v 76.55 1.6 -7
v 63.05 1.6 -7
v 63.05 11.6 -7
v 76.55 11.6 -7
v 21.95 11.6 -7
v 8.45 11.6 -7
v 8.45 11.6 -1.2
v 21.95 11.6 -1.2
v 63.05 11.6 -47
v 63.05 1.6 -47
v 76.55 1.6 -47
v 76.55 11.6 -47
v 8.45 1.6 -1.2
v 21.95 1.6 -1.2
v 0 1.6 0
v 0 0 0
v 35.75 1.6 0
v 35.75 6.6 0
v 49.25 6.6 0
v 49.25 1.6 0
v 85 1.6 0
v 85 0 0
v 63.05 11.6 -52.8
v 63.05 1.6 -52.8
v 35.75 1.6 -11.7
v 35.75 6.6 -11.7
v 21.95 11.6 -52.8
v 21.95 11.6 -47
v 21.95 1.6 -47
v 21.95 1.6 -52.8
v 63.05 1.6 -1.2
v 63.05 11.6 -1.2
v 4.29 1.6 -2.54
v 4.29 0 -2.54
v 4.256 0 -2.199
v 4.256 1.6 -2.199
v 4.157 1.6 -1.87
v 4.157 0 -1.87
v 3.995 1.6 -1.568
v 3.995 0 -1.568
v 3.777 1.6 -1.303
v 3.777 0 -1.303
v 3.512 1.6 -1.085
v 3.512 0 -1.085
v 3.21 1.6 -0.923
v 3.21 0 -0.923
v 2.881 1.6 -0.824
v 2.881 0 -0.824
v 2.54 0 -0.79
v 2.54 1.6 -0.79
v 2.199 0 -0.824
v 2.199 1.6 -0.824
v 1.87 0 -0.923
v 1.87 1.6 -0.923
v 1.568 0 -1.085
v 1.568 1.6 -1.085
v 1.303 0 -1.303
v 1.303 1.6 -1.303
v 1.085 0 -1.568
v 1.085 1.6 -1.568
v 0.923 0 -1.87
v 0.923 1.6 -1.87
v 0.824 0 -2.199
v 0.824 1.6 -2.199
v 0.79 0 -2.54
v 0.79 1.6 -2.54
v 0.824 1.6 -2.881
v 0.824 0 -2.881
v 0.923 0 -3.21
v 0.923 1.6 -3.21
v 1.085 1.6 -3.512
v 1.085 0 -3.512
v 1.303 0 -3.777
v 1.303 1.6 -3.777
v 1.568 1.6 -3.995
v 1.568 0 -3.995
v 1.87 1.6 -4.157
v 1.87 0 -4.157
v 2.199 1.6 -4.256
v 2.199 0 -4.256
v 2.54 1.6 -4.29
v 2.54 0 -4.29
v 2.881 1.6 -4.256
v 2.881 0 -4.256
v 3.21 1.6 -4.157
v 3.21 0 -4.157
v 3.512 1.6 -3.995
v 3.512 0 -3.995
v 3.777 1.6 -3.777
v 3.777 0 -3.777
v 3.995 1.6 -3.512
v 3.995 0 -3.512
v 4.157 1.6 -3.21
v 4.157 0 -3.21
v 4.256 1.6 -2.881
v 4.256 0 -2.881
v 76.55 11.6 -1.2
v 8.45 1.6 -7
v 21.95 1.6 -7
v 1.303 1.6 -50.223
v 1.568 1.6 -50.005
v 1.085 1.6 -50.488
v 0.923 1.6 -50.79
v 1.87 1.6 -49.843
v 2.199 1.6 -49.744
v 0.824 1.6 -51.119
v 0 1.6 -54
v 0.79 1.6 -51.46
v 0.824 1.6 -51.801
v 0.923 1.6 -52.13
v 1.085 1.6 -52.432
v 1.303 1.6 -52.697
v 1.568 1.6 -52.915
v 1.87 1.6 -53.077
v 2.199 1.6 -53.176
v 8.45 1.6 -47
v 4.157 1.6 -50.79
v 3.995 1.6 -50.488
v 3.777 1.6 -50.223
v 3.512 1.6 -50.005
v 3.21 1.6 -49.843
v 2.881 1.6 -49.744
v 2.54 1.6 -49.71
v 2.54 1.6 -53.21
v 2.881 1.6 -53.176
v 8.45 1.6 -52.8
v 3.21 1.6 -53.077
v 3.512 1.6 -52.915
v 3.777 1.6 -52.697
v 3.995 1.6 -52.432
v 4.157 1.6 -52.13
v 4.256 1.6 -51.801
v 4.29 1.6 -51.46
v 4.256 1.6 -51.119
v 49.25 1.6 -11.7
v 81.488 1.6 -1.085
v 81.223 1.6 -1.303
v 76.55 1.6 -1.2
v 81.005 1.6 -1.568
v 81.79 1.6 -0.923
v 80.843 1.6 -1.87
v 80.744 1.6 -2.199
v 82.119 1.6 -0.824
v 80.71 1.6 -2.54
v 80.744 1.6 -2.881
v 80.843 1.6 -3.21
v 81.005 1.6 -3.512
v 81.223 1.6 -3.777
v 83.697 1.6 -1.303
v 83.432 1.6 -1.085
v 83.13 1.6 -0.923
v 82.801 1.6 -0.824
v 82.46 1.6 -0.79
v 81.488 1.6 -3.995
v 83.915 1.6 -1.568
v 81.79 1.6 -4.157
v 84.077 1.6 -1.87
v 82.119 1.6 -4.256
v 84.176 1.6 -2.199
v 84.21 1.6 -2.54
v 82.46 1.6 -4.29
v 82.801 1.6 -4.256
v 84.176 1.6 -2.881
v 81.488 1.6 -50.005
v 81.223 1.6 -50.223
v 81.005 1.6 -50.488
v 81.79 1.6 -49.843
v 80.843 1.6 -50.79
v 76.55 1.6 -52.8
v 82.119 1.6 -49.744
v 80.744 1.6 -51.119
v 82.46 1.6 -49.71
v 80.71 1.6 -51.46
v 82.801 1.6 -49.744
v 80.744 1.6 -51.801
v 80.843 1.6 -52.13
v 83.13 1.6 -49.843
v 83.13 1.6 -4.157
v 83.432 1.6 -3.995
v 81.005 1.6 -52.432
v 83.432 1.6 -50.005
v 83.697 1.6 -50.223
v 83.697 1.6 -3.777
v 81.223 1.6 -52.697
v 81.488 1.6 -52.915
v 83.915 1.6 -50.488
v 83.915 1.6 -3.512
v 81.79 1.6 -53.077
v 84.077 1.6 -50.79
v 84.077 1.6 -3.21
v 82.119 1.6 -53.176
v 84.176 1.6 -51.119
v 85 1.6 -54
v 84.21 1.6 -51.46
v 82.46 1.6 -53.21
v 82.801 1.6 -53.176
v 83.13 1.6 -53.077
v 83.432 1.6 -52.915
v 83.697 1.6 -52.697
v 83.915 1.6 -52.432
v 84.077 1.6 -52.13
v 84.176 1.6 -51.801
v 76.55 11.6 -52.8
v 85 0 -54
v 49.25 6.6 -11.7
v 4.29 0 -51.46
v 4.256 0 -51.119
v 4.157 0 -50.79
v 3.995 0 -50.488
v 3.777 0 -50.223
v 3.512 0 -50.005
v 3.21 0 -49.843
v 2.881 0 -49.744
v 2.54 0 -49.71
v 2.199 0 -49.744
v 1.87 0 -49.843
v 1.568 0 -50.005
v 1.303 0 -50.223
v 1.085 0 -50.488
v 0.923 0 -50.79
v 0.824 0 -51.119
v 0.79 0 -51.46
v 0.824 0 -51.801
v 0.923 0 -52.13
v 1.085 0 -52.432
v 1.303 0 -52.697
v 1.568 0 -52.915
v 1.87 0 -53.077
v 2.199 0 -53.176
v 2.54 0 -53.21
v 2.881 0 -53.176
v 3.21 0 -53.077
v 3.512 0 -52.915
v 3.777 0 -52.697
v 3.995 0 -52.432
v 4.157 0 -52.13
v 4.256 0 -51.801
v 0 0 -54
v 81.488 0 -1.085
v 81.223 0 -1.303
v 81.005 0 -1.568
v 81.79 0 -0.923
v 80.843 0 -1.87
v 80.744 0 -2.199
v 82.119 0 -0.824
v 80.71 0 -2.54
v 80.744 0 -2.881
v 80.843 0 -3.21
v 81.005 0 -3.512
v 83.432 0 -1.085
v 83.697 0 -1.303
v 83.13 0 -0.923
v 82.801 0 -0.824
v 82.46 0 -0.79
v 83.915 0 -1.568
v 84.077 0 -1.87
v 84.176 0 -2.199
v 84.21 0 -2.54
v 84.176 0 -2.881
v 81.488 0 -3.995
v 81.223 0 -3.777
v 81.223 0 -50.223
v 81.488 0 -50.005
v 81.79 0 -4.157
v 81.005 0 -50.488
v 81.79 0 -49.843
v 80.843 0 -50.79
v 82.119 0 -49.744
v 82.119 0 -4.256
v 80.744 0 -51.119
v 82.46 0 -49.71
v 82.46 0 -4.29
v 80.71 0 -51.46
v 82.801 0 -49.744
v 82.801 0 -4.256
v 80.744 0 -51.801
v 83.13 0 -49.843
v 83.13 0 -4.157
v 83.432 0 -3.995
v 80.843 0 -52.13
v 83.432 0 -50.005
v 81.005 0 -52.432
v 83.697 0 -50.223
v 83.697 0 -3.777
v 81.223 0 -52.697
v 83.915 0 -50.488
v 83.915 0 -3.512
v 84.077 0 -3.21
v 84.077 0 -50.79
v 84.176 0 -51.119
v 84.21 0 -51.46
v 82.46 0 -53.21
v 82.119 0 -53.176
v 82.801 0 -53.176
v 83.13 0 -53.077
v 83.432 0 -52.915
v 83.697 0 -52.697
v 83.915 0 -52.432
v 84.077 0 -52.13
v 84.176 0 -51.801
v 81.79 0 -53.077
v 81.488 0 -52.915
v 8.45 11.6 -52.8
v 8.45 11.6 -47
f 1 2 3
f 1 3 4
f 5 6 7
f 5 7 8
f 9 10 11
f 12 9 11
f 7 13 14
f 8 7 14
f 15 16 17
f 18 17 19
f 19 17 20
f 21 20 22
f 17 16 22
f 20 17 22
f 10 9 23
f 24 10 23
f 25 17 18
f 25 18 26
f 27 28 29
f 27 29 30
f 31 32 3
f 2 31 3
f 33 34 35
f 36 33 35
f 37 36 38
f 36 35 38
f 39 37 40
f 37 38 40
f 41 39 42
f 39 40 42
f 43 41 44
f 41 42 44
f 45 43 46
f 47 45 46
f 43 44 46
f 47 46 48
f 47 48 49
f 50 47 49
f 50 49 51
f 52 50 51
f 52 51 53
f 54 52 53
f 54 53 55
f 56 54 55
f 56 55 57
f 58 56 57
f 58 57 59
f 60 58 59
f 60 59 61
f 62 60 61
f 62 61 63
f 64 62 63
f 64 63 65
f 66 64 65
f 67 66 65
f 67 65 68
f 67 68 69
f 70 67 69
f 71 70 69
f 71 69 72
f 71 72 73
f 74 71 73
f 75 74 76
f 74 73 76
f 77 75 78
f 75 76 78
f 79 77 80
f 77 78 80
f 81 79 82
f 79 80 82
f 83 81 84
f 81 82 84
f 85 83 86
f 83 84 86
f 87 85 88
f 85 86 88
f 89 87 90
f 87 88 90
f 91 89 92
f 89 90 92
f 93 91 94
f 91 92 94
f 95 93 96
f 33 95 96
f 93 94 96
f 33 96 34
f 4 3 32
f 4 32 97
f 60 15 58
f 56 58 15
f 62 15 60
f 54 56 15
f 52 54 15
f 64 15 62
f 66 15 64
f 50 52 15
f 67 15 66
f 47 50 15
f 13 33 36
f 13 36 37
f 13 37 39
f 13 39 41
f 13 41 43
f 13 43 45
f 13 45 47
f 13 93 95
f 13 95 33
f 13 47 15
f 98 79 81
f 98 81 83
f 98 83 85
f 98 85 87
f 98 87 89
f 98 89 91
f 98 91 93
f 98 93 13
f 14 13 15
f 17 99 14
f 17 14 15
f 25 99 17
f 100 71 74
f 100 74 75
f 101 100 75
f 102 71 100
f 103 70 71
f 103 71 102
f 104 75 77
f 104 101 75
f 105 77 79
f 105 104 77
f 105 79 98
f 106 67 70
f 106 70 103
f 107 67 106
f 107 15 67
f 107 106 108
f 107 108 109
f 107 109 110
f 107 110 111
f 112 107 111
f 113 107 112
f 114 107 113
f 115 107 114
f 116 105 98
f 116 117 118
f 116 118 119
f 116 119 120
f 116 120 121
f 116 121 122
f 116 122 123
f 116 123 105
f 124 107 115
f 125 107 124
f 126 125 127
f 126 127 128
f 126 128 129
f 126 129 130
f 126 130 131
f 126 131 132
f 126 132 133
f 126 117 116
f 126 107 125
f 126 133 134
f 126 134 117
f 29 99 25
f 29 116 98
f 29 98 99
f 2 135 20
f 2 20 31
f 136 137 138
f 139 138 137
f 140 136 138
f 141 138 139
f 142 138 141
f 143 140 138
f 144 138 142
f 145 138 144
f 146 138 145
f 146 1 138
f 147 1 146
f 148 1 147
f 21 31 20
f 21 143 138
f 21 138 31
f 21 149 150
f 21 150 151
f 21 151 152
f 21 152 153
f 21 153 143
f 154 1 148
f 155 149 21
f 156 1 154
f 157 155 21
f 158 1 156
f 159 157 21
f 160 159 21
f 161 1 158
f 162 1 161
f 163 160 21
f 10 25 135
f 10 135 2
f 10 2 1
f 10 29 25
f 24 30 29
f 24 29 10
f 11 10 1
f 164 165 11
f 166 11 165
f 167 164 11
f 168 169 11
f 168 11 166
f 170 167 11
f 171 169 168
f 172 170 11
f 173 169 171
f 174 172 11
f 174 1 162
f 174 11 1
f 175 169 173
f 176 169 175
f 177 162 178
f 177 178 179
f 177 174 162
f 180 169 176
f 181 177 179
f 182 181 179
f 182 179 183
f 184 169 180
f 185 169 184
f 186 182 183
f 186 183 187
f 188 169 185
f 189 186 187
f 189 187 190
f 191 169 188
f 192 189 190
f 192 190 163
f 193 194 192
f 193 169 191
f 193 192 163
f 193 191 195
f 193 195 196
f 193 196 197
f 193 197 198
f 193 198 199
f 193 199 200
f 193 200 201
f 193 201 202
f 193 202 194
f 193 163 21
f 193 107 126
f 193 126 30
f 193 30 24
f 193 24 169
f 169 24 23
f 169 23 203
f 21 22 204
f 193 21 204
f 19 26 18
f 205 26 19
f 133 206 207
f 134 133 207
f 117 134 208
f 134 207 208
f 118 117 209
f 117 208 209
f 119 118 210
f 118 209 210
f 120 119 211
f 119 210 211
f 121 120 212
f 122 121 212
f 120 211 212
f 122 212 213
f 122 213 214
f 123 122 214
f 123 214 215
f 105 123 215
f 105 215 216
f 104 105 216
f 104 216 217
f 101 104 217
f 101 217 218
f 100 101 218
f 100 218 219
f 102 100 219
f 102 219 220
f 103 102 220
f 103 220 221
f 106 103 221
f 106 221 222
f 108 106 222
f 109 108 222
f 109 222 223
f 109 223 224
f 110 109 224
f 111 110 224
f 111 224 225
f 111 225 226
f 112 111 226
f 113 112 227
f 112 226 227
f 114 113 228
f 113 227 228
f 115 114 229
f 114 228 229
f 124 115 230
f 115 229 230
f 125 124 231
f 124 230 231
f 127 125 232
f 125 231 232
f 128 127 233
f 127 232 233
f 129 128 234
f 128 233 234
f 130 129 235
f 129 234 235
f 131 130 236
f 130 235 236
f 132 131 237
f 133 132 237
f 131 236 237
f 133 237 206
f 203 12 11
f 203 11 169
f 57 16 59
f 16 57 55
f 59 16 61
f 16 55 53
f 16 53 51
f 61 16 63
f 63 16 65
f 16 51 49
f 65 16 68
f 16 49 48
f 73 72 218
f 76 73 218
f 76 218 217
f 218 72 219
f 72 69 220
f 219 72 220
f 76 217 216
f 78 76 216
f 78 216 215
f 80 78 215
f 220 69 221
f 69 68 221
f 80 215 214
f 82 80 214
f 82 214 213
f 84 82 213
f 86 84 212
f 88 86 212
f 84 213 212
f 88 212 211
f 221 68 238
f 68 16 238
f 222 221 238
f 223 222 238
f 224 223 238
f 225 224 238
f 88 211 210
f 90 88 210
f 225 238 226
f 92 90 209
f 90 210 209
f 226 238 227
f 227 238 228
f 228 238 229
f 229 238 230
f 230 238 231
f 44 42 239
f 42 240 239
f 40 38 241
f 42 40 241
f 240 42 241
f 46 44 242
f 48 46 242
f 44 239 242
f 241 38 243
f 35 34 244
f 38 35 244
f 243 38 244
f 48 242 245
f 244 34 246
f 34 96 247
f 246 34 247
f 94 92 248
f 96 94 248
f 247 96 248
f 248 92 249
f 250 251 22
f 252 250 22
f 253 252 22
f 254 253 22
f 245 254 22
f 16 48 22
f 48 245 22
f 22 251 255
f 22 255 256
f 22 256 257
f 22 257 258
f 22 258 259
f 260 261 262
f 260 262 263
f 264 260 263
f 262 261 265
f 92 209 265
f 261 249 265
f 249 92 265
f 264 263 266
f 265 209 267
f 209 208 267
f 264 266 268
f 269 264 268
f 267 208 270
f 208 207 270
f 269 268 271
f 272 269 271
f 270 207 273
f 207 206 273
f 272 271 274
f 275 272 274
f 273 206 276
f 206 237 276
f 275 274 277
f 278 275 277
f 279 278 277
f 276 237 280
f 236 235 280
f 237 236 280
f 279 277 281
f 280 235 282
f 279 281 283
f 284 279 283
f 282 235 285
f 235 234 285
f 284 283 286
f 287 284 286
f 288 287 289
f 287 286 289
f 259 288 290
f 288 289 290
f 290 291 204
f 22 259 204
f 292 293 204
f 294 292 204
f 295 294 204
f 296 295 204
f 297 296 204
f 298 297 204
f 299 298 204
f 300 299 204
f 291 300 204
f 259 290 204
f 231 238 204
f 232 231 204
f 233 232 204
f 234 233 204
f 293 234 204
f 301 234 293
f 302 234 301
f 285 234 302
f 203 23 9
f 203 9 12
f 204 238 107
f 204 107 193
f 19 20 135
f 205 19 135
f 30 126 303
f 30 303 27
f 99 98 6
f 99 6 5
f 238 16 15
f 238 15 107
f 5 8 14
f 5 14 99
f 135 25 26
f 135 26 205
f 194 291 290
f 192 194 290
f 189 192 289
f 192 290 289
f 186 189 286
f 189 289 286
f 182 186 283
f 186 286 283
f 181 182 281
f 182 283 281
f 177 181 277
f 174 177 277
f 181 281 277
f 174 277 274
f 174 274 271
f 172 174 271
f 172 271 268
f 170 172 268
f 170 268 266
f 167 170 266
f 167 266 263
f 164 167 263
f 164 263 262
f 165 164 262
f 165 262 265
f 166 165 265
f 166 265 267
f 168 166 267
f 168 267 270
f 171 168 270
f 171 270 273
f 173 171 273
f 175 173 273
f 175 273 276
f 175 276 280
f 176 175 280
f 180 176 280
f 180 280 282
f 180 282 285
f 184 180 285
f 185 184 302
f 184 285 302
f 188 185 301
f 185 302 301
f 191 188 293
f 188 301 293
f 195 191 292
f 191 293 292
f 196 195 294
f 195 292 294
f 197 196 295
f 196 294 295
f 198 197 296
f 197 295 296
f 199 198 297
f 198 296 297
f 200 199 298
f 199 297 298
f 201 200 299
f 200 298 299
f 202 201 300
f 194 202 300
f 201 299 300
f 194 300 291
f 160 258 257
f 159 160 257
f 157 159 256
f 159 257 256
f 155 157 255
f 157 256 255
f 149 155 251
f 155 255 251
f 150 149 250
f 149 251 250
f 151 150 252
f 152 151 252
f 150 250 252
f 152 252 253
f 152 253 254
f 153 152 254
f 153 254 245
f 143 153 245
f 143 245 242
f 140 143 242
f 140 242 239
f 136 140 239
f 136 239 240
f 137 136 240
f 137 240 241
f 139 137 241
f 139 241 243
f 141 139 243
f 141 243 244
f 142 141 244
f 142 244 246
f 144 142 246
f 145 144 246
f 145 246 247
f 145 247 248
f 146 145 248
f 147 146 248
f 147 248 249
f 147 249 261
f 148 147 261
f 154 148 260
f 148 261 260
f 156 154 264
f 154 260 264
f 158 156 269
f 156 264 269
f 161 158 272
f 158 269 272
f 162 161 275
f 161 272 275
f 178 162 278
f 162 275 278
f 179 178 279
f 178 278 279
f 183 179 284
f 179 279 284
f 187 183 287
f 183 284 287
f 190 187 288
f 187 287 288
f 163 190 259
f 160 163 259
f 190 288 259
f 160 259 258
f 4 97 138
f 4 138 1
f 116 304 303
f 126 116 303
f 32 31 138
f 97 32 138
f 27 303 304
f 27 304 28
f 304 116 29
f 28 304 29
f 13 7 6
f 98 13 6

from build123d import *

# Parameters (mm, degrees)
SKETCH7_W                  = 85
SKETCH7_H                  = 54
BOSS_EXTRUDE2_DEPTH        = 1.6
F_3_5_3_5_DIAMETER_HOLE1_D = 3.5
SKETCH14_W                 = 13.5
SKETCH14_H                 = 5.8
BOSS_EXTRUDE3_DEPTH        = 10
LPATTERN1_COUNT            = 2
LPATTERN1_PITCH            = 54.6
LPATTERN1_COUNT_DIR2       = 2
LPATTERN1_PITCH_DIR2       = 45.8
SKETCH15_W                 = 13.5
SKETCH15_H                 = 11.7
BOSS_EXTRUDE4_DEPTH        = 5


with BuildPart() as part:
    # Sketch7 → Boss-Extrude2 (new body)
    with BuildSketch(Plane(origin=(0, 0, 0), x_dir=(1, 0, 0), z_dir=(0, 1, 0))):
        with Locations((42.5, 27)):
            Rectangle(SKETCH7_W, SKETCH7_H)
    extrude(amount=BOSS_EXTRUDE2_DEPTH)

    # Ø3.5 (3.5) Diameter Hole1 (through all)
    with Locations(Plane(origin=(0, 1.6, 0), x_dir=(-1, 0, 0), z_dir=(0, 1, 0))):
        with Locations((-2.54, -2.54), (-2.54, -51.46), (-82.46, -51.46), (-82.46, -2.54)):
            Hole(F_3_5_3_5_DIAMETER_HOLE1_D / 2)

    # Sketch14 → Boss-Extrude3 (add)
    with BuildSketch(Plane(origin=(0, 1.6, 0), x_dir=(1, 0, 0), z_dir=(0, 1, 0))):
        with Locations((15.2, 49.9)):
            Rectangle(SKETCH14_W, SKETCH14_H)
    boss_extrude3 = extrude(amount=BOSS_EXTRUDE3_DEPTH)

    # LPattern1: Boss-Extrude3 2 × 2
    with Locations(*[(i * LPATTERN1_PITCH, 0, j * LPATTERN1_PITCH_DIR2) for i in range(LPATTERN1_COUNT) for j in range(LPATTERN1_COUNT_DIR2) if (i, j) != (0, 0)]):
        add(boss_extrude3)

    # Sketch15 → Boss-Extrude4 (add)
    with BuildSketch(Plane(origin=(0, 1.6, 0), x_dir=(1, 0, 0), z_dir=(0, 1, 0))):
        with Locations((42.5, 5.85)):
            Rectangle(SKETCH15_W, SKETCH15_H)
    extrude(amount=BOSS_EXTRUDE4_DEPTH)


solid = part.part
